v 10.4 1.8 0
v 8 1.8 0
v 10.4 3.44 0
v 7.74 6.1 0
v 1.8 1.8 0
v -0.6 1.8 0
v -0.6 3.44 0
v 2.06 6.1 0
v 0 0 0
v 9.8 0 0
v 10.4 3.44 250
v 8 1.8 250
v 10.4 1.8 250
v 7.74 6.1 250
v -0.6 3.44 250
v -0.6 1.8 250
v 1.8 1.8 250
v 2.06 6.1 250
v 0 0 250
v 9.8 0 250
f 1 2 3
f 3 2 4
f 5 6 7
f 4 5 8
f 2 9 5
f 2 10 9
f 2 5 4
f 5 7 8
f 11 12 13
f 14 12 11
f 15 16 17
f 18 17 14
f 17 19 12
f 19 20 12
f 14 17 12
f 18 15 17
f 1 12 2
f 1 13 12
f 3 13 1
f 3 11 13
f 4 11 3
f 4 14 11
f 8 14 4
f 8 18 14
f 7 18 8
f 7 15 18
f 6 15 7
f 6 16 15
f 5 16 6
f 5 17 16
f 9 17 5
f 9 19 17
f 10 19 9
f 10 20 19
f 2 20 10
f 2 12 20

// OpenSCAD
// Generated by SolidPython 1.1.3 on 2022-04-28 23:56:22


linear_extrude(center = false, convexity = 10, height = 250, twist = 0) {
	polygon(points = [[0.0000000000, 0.0000000000], [1.8000000000, 1.8000000000], [-0.6000000000, 1.8000000000], [-0.6000000000, 3.4400000000], [2.0600000000, 6.1000000000], [7.7400000000, 6.1000000000], [10.4000000000, 3.4400000000], [10.4000000000, 1.8000000000], [8, 1.8000000000], [9.8000000000, 0.0000000000], [0.0000000000, 0.0000000000]]);
}
/***********************************************
*********      SolidPython code:      **********
************************************************
 
from solid import *
from solid.utils import *  # Not required, but the utils module is useful

GROOVE_WIDTH = 9.8

def make_groove(height):
    # Define the shape of the vslot grooves as a polygon.
    groove_points = [
        [0.0, 0.0, 0.0],
        [1.8, 1.8, 0.0],
        [-0.6, 1.8, 0.0],
        [-0.6, 3.44, 0.0],
        [2.06, 6.1, 0.0],
        [7.74, 6.1, 0.0],
        [10.4, 3.44, 0.0],
        [10.4, 1.8, 0.0],
        [8, 1.8, 0.0],
        [9.8, 0.0, 0.0],
        [0.0, 0.0, 0.0],
    ];

    # Extrude the groove polygon into a 3d object.
    return linear_extrude(height = height, center = False, convexity = 10, twist = 0)(
        polygon(groove_points)
    );

def make_2020(height):
    # Overall dimensions
    side = 20.0;

    translate_dist = (side/2) - (GROOVE_WIDTH/2);

    bottom_groove = right(translate_dist)(
        make_groove(height)
    );

    left_groove = forward(translate_dist + GROOVE_WIDTH)(
        rotate([0, 0, 270])(
            make_groove(height)
        )
    );

    top_groove = right(translate_dist + GROOVE_WIDTH)(
        forward(side)(
            rotate([0, 0, 180])(
                make_groove(height)
            )
        )
    );
    
    right_groove = right(side)(
        forward(translate_dist)(
            rotate([0, 0, 90])(
                make_groove(height)
            )
        )
    );

    center_hole = forward(side/2)(
        right(side/2)(
            cylinder(h=height, r=2.1, segments=50)
        )
    );

    return cube([side, side, height]) - bottom_groove - left_groove - top_groove - right_groove - center_hole;

# Test renders
scad_render_to_file(make_2020(250), '../../scad/vslot2020_250mm.scad');
scad_render_to_file(make_2020(500), '../../scad/vslot2020_500mm.scad');
scad_render_to_file(make_2020(1000), '../../scad/vslot2020_1000mm.scad');
scad_render_to_file(make_2020(1500), '../../scad/vslot2020_1500mm.scad');
scad_render_to_file(make_2020(2000), '../../scad/vslot2020_2000mm.scad');
scad_render_to_file(make_groove(250), '../../scad/vslotgroove.scad'); 
 
************************************************/
